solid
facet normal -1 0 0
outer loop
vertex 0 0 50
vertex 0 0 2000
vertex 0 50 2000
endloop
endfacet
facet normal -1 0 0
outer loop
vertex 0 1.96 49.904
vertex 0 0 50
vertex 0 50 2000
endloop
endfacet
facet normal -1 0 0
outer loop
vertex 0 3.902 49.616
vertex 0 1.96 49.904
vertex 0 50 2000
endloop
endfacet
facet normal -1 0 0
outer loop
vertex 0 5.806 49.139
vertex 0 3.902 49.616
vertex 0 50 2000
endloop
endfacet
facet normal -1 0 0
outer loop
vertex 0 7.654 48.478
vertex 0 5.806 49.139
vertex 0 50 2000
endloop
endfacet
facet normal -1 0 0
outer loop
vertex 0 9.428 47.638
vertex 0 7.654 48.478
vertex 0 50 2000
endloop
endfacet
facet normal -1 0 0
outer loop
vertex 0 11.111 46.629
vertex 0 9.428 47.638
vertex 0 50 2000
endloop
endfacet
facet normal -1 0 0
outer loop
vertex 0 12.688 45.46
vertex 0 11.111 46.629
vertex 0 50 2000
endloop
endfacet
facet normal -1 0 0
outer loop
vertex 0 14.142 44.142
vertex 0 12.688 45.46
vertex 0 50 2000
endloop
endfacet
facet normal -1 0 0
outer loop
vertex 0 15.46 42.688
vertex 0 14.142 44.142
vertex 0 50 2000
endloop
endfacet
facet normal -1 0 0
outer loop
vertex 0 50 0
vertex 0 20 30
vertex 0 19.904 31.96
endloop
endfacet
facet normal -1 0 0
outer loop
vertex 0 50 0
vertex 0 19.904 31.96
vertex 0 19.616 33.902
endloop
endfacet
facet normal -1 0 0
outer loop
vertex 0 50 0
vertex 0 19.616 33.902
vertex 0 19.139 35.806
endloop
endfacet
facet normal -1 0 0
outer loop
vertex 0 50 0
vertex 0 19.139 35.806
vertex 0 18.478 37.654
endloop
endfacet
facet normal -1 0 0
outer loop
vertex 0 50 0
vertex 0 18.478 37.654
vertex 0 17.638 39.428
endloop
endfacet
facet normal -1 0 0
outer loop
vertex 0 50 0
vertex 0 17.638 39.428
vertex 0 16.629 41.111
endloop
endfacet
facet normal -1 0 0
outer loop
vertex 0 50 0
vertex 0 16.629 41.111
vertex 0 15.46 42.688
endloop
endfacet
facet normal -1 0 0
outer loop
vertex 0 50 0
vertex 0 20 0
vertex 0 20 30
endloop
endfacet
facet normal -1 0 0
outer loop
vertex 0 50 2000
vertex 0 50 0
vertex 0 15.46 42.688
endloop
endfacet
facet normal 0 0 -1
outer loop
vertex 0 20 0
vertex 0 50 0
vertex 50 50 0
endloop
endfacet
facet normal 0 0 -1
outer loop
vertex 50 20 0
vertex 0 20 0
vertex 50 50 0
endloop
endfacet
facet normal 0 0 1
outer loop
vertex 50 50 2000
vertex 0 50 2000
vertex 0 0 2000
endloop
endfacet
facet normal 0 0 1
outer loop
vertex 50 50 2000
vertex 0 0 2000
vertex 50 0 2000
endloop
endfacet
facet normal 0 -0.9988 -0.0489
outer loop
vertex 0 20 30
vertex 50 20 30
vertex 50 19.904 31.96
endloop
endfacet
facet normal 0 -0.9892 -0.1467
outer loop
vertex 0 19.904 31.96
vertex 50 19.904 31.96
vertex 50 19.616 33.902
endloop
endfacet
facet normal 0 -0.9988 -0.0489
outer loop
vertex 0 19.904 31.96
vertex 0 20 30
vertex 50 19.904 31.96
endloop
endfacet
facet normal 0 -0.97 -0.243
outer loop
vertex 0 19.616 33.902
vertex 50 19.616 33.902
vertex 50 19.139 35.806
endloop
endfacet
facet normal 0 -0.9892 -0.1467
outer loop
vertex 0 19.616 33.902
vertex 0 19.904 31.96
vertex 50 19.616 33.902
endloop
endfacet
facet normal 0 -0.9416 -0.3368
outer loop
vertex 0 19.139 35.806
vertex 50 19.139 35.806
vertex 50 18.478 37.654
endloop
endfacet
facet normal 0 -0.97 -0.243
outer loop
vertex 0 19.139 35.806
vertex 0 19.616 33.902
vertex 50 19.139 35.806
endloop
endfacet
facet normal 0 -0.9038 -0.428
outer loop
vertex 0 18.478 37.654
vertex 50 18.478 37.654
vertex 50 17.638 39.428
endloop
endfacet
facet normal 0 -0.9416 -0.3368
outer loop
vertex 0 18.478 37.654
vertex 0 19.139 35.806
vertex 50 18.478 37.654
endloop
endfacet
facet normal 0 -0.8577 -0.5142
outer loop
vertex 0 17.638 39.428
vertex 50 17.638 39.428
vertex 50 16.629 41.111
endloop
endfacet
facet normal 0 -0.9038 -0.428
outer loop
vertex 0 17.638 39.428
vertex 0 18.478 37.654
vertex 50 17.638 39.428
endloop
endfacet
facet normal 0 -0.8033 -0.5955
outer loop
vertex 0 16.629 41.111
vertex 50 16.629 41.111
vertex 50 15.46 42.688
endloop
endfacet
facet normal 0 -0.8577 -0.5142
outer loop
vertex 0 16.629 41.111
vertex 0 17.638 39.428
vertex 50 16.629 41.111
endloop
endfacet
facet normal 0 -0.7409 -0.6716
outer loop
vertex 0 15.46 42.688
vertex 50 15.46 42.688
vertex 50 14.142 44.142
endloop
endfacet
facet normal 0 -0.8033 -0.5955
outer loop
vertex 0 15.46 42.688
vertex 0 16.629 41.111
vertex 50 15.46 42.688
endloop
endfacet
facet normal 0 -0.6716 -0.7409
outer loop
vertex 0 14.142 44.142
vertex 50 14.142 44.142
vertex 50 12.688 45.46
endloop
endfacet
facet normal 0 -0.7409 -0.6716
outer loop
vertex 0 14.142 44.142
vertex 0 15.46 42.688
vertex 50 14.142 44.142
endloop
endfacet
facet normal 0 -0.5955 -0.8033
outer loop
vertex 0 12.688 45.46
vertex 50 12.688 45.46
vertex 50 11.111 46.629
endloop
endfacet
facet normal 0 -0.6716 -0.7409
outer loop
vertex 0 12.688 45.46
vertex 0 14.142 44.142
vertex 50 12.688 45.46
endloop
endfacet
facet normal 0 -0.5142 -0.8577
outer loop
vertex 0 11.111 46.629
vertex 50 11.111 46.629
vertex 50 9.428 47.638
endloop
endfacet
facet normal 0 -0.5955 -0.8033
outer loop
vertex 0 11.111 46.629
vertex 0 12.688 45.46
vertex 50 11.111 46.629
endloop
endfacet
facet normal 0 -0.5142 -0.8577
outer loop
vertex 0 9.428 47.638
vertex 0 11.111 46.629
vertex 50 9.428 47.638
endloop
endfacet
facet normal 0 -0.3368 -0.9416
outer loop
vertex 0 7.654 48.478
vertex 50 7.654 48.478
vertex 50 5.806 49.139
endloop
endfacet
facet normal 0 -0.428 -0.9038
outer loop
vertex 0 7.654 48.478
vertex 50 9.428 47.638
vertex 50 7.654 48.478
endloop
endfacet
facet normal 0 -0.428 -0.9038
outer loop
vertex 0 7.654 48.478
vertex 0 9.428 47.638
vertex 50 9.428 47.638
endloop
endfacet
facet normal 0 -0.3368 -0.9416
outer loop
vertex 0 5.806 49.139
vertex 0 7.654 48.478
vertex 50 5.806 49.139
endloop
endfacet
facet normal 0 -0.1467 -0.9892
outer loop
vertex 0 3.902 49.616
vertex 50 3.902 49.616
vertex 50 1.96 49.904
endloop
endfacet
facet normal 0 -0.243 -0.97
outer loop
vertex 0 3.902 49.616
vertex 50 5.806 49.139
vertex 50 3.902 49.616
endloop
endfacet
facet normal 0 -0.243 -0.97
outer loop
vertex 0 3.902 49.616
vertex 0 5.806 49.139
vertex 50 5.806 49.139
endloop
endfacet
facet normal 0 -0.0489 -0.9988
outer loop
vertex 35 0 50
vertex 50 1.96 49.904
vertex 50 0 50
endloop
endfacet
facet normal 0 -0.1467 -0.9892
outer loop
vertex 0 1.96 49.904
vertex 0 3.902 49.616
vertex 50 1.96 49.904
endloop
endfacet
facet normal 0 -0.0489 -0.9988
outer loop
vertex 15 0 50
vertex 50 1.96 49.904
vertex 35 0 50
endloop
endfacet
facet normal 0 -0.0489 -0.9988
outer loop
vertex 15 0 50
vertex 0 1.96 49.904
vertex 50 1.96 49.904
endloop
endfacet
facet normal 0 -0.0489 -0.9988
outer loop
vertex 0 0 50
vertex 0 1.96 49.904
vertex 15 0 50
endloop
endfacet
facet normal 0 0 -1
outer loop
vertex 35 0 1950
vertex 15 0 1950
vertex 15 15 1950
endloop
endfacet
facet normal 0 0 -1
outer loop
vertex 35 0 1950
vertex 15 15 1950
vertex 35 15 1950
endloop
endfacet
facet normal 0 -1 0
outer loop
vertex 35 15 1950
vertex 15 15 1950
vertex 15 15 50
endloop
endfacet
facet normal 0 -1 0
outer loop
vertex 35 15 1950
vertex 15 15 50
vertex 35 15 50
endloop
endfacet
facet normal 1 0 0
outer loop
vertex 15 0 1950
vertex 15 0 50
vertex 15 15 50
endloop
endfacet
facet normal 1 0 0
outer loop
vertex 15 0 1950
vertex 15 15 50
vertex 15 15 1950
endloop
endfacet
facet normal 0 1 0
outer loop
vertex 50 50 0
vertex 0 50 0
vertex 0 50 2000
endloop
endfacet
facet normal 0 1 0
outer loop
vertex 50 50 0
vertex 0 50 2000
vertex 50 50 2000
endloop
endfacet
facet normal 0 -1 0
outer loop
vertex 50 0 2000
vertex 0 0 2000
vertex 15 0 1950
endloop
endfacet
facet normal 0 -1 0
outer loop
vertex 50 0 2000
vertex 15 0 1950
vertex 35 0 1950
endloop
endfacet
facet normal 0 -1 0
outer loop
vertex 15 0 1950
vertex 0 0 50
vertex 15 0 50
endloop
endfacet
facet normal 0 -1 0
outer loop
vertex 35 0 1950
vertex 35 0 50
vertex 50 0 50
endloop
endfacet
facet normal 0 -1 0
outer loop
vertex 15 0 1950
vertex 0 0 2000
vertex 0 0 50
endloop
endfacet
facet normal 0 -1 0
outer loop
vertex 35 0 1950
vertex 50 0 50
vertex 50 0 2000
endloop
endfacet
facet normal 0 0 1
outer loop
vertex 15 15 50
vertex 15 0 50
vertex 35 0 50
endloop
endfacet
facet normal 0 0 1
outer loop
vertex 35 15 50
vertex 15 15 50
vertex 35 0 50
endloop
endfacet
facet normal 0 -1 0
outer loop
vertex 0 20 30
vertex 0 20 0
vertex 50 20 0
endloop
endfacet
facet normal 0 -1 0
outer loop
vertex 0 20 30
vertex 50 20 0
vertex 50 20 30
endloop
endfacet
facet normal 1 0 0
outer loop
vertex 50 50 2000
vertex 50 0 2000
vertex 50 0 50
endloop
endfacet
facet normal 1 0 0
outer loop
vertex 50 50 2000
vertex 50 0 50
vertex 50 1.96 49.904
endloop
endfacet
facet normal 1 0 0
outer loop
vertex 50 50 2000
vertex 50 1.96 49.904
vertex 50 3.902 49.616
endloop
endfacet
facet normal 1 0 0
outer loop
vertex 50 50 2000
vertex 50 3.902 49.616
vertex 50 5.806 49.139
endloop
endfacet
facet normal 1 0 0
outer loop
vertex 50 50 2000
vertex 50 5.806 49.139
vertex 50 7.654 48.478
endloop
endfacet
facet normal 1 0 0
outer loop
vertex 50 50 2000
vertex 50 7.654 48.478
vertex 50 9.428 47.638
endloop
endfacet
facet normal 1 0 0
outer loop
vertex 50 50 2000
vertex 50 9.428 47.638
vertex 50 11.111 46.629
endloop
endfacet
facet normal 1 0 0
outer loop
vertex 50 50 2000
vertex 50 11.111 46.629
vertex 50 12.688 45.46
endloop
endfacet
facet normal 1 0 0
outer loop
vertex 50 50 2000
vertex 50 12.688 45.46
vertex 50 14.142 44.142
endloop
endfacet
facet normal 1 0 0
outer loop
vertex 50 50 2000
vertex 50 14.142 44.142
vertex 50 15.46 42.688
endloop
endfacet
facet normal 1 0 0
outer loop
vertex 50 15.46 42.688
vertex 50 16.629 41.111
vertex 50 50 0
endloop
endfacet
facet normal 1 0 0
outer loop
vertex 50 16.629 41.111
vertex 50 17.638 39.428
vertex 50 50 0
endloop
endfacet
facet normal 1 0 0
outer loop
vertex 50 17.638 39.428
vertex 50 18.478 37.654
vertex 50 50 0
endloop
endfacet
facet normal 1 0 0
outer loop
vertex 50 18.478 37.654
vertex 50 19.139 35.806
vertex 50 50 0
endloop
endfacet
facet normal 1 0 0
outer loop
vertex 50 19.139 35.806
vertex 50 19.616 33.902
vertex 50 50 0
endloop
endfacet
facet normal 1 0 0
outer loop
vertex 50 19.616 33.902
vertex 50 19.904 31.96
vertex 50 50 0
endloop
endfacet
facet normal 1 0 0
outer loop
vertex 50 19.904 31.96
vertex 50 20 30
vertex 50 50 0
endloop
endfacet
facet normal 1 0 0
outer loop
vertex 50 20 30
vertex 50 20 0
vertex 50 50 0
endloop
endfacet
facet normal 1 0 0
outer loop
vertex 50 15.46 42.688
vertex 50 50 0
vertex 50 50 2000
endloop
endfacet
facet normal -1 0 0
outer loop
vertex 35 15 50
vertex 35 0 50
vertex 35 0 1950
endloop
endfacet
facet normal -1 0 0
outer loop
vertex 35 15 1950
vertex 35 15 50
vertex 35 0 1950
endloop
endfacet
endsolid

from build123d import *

# Parameters (mm, degrees)
F0_W     = 50
F0_H     = 50
F1_DEPTH = 2000
F2_W     = 20
F2_H     = 1900
F3_DEPTH = 15
F5_DEPTH = 50.001


with BuildPart() as f1:
    # F0 (on Top) → F1 (new body)
    with BuildSketch(Plane.XY):
        with Locations((25, 25)):
            Rectangle(F0_W, F0_H)
    extrude(amount=F1_DEPTH)

    # F2 (on Front) → F3 (cut)
    with BuildSketch(Plane.XZ):
        with Locations((25, 1000)):
            Rectangle(F2_W, F2_H)
    extrude(amount=-F3_DEPTH, mode=Mode.SUBTRACT)

    # F4 (on Right) → F5 (cut, through all)
    with BuildSketch(Plane.YZ):
        with BuildLine():
            Line((0, 50), (0, 0))
            Line((0, 0), (20, 0))
            Line((20, 0), (20, 30))
            ThreePointArc((20, 30), (14.142136, 44.142136), (0, 50))
        make_face()
    extrude(amount=F5_DEPTH, mode=Mode.SUBTRACT)


solid = f1.part
